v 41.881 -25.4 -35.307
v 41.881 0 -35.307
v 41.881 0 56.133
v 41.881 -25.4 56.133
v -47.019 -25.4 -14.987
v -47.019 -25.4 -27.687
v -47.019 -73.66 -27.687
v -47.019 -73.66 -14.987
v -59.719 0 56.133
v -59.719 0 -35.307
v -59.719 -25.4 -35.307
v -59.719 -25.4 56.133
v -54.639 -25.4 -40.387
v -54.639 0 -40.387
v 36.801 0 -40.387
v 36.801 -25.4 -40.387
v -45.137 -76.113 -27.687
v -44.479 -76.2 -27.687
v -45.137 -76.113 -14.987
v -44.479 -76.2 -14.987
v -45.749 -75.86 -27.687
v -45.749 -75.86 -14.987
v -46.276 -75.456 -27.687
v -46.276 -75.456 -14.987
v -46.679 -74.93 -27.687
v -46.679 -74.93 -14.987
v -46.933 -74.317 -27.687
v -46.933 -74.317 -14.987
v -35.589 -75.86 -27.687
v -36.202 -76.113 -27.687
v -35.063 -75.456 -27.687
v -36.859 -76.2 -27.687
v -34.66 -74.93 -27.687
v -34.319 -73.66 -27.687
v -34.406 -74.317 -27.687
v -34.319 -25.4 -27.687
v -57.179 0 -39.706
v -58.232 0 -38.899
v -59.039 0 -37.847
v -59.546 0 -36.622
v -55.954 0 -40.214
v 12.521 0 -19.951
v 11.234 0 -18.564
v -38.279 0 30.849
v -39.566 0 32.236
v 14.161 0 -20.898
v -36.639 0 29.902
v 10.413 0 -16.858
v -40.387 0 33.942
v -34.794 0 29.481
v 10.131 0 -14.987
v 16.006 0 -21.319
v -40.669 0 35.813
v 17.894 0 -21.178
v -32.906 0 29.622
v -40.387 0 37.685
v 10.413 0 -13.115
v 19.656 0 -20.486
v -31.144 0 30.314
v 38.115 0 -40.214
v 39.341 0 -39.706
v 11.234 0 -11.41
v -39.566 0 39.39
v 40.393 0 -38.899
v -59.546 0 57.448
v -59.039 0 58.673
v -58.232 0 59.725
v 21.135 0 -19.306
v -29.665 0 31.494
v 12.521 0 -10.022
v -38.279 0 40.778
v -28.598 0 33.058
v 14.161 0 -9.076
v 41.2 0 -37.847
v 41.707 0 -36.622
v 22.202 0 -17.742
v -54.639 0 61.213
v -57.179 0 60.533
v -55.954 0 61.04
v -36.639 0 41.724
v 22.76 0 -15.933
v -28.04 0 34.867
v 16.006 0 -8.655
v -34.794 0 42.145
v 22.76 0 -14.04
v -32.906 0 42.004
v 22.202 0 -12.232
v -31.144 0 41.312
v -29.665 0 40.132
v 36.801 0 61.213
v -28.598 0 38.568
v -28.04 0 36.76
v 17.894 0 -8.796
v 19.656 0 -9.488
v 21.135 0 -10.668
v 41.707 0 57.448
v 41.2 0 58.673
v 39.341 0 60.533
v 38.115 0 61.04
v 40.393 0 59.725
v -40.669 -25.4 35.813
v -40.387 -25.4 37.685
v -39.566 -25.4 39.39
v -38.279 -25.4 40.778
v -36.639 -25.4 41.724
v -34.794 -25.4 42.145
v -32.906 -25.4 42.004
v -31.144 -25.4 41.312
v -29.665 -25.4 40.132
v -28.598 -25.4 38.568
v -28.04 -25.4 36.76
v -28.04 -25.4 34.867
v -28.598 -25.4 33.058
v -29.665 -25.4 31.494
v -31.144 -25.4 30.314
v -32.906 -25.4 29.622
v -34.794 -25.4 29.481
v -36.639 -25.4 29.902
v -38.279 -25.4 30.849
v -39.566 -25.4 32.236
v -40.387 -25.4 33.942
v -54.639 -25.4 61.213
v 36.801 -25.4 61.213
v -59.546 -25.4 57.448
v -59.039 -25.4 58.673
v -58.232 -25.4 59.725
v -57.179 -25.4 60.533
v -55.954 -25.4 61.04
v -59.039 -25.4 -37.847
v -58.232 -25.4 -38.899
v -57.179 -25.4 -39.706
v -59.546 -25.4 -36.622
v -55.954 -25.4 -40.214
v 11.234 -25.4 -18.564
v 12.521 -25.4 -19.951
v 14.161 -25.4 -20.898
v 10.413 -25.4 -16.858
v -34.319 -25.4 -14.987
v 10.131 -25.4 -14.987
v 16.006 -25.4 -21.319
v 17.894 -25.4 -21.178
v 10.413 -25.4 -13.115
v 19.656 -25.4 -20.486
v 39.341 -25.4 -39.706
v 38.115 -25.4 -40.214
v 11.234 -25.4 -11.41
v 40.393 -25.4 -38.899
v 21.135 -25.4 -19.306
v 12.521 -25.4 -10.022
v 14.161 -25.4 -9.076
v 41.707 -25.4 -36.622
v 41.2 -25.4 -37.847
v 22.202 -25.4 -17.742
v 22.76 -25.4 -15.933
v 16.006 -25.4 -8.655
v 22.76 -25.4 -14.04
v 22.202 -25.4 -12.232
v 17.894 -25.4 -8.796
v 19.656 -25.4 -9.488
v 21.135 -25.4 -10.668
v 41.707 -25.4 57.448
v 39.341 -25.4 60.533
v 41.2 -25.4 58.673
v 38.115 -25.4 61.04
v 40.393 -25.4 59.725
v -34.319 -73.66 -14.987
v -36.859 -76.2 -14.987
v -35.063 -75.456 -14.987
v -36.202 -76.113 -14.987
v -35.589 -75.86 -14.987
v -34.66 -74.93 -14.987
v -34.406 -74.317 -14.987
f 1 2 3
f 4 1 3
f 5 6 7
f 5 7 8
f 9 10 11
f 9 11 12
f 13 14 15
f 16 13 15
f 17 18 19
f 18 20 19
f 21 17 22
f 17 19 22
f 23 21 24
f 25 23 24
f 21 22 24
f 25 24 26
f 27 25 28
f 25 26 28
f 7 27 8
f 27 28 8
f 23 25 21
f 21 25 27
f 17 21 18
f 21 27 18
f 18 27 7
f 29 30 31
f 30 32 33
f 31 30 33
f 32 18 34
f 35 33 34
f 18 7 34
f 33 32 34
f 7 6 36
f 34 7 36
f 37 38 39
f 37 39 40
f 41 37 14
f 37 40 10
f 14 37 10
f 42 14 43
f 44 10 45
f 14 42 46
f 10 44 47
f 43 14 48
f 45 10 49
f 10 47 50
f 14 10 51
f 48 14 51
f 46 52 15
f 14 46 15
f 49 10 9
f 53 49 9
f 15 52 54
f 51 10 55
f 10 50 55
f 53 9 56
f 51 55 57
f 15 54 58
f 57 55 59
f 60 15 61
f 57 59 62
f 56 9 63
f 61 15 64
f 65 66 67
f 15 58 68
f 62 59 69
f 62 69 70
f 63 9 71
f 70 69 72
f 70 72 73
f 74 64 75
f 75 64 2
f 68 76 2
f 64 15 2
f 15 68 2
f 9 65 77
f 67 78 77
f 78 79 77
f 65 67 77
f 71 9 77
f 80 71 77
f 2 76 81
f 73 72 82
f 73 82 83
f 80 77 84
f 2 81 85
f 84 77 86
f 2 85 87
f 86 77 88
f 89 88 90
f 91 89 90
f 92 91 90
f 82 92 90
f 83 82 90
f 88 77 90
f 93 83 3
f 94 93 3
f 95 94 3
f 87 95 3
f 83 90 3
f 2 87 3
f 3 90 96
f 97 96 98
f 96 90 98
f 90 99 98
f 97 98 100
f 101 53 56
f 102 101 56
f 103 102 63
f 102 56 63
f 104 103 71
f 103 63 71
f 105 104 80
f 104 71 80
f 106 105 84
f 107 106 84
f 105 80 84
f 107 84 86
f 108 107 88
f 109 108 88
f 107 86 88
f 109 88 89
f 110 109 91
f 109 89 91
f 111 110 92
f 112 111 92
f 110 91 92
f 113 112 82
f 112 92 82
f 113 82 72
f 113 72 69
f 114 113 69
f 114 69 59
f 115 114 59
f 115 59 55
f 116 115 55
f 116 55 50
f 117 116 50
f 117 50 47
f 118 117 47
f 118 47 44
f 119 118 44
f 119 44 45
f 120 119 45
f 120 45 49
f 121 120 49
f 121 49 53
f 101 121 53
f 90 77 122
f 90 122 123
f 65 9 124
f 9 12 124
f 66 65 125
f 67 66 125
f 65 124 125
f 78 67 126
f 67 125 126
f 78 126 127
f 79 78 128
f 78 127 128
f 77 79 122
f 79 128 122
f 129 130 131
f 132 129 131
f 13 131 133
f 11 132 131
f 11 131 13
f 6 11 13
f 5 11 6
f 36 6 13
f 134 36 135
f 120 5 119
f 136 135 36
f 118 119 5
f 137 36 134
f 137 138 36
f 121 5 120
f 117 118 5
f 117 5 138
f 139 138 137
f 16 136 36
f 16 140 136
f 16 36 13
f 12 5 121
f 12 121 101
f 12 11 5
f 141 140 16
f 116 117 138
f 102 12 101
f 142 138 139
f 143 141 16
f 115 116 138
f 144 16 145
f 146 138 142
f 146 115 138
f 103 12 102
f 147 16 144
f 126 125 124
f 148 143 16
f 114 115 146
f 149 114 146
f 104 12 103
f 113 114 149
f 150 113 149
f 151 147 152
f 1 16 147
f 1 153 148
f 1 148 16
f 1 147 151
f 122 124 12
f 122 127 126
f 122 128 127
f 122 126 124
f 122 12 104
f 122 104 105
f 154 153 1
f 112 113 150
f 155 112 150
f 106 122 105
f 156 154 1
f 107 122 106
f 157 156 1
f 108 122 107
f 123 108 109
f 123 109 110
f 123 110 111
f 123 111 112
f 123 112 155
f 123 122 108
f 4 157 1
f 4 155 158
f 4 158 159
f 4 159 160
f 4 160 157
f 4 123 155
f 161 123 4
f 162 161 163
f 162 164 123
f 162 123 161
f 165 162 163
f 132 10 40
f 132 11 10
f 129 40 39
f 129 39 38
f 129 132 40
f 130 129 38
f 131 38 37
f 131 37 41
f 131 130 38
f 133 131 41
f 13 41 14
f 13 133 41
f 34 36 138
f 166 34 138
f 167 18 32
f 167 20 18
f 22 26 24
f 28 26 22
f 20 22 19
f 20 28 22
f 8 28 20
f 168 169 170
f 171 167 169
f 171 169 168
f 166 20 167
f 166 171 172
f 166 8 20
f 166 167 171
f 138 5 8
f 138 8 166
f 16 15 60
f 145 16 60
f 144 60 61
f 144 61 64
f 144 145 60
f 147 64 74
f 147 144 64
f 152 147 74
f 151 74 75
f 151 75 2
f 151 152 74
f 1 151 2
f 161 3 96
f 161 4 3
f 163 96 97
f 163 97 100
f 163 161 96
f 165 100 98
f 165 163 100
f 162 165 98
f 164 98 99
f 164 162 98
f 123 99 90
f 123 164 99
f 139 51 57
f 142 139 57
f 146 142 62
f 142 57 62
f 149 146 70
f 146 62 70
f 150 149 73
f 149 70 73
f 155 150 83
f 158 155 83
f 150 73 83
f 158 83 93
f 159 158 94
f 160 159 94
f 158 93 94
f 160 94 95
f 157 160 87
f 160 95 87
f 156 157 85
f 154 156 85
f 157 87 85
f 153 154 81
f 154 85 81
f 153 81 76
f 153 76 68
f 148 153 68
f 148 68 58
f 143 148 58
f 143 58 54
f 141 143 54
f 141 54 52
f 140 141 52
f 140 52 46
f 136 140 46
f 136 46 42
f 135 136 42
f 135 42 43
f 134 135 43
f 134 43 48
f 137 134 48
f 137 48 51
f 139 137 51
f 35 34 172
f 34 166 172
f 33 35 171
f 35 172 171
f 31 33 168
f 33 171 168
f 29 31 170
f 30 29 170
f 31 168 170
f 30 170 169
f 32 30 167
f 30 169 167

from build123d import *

# Parameters (mm, degrees)
F0_W      = 101.6
F0_H      = 101.6
F1_DEPTH  = 25.4
F2_R      = 5.08
F3_R      = 5.08
F4_R      = 5.08
F5_R      = 5.08
F8_D      = 12.7
F10_W     = 12.7
F10_H     = 12.7
F11_DEPTH = 50.8
F12_R     = 2.54
F13_R     = 2.54


with BuildPart() as f1:
    # F0 (on Front) → F1 (new body)
    with BuildSketch(Plane.XZ):
        with Locations((-8.919485, 10.413215)):
            Rectangle(F0_W, F0_H)
    extrude(amount=F1_DEPTH)

    # F2
    f2_edges = [f1.edges().sort_by_distance(p)[0] for p in [
        (-59.719485, -12.7, 61.213215),
    ]]
    fillet(f2_edges, radius=F2_R)

    # F3
    f3_edges = [f1.edges().sort_by_distance(p)[0] for p in [
        (-59.719485, -12.7, -40.386785),
    ]]
    fillet(f3_edges, radius=F3_R)

    # F4
    f4_edges = [f1.edges().sort_by_distance(p)[0] for p in [
        (41.880515, -12.7, -40.386785),
    ]]
    fillet(f4_edges, radius=F4_R)

    # F5
    f5_edges = [f1.edges().sort_by_distance(p)[0] for p in [
        (41.880515, -12.7, 61.213215),
    ]]
    fillet(f5_edges, radius=F5_R)

    # F8 (through all)
    with Locations(Plane.XZ.offset(25.4)):
        with Locations((-34.319485, 35.813215), (16.480515, -14.986785)):
            Hole(F8_D / 2)

    # F10 (on face) → F11 (join)
    with BuildSketch(Plane.XZ.offset(25.4)):
        with Locations((-40.669485, -21.336785)):
            Rectangle(F10_W, F10_H)
    extrude(amount=F11_DEPTH)

    # F12
    f12_edges = [f1.edges().sort_by_distance(p)[0] for p in [
        (-34.319485, -76.2, -21.336785),
    ]]
    fillet(f12_edges, radius=F12_R)

    # F13
    f13_edges = [f1.edges().sort_by_distance(p)[0] for p in [
        (-47.019485, -76.2, -21.336785),
    ]]
    fillet(f13_edges, radius=F13_R)


solid = f1.part
